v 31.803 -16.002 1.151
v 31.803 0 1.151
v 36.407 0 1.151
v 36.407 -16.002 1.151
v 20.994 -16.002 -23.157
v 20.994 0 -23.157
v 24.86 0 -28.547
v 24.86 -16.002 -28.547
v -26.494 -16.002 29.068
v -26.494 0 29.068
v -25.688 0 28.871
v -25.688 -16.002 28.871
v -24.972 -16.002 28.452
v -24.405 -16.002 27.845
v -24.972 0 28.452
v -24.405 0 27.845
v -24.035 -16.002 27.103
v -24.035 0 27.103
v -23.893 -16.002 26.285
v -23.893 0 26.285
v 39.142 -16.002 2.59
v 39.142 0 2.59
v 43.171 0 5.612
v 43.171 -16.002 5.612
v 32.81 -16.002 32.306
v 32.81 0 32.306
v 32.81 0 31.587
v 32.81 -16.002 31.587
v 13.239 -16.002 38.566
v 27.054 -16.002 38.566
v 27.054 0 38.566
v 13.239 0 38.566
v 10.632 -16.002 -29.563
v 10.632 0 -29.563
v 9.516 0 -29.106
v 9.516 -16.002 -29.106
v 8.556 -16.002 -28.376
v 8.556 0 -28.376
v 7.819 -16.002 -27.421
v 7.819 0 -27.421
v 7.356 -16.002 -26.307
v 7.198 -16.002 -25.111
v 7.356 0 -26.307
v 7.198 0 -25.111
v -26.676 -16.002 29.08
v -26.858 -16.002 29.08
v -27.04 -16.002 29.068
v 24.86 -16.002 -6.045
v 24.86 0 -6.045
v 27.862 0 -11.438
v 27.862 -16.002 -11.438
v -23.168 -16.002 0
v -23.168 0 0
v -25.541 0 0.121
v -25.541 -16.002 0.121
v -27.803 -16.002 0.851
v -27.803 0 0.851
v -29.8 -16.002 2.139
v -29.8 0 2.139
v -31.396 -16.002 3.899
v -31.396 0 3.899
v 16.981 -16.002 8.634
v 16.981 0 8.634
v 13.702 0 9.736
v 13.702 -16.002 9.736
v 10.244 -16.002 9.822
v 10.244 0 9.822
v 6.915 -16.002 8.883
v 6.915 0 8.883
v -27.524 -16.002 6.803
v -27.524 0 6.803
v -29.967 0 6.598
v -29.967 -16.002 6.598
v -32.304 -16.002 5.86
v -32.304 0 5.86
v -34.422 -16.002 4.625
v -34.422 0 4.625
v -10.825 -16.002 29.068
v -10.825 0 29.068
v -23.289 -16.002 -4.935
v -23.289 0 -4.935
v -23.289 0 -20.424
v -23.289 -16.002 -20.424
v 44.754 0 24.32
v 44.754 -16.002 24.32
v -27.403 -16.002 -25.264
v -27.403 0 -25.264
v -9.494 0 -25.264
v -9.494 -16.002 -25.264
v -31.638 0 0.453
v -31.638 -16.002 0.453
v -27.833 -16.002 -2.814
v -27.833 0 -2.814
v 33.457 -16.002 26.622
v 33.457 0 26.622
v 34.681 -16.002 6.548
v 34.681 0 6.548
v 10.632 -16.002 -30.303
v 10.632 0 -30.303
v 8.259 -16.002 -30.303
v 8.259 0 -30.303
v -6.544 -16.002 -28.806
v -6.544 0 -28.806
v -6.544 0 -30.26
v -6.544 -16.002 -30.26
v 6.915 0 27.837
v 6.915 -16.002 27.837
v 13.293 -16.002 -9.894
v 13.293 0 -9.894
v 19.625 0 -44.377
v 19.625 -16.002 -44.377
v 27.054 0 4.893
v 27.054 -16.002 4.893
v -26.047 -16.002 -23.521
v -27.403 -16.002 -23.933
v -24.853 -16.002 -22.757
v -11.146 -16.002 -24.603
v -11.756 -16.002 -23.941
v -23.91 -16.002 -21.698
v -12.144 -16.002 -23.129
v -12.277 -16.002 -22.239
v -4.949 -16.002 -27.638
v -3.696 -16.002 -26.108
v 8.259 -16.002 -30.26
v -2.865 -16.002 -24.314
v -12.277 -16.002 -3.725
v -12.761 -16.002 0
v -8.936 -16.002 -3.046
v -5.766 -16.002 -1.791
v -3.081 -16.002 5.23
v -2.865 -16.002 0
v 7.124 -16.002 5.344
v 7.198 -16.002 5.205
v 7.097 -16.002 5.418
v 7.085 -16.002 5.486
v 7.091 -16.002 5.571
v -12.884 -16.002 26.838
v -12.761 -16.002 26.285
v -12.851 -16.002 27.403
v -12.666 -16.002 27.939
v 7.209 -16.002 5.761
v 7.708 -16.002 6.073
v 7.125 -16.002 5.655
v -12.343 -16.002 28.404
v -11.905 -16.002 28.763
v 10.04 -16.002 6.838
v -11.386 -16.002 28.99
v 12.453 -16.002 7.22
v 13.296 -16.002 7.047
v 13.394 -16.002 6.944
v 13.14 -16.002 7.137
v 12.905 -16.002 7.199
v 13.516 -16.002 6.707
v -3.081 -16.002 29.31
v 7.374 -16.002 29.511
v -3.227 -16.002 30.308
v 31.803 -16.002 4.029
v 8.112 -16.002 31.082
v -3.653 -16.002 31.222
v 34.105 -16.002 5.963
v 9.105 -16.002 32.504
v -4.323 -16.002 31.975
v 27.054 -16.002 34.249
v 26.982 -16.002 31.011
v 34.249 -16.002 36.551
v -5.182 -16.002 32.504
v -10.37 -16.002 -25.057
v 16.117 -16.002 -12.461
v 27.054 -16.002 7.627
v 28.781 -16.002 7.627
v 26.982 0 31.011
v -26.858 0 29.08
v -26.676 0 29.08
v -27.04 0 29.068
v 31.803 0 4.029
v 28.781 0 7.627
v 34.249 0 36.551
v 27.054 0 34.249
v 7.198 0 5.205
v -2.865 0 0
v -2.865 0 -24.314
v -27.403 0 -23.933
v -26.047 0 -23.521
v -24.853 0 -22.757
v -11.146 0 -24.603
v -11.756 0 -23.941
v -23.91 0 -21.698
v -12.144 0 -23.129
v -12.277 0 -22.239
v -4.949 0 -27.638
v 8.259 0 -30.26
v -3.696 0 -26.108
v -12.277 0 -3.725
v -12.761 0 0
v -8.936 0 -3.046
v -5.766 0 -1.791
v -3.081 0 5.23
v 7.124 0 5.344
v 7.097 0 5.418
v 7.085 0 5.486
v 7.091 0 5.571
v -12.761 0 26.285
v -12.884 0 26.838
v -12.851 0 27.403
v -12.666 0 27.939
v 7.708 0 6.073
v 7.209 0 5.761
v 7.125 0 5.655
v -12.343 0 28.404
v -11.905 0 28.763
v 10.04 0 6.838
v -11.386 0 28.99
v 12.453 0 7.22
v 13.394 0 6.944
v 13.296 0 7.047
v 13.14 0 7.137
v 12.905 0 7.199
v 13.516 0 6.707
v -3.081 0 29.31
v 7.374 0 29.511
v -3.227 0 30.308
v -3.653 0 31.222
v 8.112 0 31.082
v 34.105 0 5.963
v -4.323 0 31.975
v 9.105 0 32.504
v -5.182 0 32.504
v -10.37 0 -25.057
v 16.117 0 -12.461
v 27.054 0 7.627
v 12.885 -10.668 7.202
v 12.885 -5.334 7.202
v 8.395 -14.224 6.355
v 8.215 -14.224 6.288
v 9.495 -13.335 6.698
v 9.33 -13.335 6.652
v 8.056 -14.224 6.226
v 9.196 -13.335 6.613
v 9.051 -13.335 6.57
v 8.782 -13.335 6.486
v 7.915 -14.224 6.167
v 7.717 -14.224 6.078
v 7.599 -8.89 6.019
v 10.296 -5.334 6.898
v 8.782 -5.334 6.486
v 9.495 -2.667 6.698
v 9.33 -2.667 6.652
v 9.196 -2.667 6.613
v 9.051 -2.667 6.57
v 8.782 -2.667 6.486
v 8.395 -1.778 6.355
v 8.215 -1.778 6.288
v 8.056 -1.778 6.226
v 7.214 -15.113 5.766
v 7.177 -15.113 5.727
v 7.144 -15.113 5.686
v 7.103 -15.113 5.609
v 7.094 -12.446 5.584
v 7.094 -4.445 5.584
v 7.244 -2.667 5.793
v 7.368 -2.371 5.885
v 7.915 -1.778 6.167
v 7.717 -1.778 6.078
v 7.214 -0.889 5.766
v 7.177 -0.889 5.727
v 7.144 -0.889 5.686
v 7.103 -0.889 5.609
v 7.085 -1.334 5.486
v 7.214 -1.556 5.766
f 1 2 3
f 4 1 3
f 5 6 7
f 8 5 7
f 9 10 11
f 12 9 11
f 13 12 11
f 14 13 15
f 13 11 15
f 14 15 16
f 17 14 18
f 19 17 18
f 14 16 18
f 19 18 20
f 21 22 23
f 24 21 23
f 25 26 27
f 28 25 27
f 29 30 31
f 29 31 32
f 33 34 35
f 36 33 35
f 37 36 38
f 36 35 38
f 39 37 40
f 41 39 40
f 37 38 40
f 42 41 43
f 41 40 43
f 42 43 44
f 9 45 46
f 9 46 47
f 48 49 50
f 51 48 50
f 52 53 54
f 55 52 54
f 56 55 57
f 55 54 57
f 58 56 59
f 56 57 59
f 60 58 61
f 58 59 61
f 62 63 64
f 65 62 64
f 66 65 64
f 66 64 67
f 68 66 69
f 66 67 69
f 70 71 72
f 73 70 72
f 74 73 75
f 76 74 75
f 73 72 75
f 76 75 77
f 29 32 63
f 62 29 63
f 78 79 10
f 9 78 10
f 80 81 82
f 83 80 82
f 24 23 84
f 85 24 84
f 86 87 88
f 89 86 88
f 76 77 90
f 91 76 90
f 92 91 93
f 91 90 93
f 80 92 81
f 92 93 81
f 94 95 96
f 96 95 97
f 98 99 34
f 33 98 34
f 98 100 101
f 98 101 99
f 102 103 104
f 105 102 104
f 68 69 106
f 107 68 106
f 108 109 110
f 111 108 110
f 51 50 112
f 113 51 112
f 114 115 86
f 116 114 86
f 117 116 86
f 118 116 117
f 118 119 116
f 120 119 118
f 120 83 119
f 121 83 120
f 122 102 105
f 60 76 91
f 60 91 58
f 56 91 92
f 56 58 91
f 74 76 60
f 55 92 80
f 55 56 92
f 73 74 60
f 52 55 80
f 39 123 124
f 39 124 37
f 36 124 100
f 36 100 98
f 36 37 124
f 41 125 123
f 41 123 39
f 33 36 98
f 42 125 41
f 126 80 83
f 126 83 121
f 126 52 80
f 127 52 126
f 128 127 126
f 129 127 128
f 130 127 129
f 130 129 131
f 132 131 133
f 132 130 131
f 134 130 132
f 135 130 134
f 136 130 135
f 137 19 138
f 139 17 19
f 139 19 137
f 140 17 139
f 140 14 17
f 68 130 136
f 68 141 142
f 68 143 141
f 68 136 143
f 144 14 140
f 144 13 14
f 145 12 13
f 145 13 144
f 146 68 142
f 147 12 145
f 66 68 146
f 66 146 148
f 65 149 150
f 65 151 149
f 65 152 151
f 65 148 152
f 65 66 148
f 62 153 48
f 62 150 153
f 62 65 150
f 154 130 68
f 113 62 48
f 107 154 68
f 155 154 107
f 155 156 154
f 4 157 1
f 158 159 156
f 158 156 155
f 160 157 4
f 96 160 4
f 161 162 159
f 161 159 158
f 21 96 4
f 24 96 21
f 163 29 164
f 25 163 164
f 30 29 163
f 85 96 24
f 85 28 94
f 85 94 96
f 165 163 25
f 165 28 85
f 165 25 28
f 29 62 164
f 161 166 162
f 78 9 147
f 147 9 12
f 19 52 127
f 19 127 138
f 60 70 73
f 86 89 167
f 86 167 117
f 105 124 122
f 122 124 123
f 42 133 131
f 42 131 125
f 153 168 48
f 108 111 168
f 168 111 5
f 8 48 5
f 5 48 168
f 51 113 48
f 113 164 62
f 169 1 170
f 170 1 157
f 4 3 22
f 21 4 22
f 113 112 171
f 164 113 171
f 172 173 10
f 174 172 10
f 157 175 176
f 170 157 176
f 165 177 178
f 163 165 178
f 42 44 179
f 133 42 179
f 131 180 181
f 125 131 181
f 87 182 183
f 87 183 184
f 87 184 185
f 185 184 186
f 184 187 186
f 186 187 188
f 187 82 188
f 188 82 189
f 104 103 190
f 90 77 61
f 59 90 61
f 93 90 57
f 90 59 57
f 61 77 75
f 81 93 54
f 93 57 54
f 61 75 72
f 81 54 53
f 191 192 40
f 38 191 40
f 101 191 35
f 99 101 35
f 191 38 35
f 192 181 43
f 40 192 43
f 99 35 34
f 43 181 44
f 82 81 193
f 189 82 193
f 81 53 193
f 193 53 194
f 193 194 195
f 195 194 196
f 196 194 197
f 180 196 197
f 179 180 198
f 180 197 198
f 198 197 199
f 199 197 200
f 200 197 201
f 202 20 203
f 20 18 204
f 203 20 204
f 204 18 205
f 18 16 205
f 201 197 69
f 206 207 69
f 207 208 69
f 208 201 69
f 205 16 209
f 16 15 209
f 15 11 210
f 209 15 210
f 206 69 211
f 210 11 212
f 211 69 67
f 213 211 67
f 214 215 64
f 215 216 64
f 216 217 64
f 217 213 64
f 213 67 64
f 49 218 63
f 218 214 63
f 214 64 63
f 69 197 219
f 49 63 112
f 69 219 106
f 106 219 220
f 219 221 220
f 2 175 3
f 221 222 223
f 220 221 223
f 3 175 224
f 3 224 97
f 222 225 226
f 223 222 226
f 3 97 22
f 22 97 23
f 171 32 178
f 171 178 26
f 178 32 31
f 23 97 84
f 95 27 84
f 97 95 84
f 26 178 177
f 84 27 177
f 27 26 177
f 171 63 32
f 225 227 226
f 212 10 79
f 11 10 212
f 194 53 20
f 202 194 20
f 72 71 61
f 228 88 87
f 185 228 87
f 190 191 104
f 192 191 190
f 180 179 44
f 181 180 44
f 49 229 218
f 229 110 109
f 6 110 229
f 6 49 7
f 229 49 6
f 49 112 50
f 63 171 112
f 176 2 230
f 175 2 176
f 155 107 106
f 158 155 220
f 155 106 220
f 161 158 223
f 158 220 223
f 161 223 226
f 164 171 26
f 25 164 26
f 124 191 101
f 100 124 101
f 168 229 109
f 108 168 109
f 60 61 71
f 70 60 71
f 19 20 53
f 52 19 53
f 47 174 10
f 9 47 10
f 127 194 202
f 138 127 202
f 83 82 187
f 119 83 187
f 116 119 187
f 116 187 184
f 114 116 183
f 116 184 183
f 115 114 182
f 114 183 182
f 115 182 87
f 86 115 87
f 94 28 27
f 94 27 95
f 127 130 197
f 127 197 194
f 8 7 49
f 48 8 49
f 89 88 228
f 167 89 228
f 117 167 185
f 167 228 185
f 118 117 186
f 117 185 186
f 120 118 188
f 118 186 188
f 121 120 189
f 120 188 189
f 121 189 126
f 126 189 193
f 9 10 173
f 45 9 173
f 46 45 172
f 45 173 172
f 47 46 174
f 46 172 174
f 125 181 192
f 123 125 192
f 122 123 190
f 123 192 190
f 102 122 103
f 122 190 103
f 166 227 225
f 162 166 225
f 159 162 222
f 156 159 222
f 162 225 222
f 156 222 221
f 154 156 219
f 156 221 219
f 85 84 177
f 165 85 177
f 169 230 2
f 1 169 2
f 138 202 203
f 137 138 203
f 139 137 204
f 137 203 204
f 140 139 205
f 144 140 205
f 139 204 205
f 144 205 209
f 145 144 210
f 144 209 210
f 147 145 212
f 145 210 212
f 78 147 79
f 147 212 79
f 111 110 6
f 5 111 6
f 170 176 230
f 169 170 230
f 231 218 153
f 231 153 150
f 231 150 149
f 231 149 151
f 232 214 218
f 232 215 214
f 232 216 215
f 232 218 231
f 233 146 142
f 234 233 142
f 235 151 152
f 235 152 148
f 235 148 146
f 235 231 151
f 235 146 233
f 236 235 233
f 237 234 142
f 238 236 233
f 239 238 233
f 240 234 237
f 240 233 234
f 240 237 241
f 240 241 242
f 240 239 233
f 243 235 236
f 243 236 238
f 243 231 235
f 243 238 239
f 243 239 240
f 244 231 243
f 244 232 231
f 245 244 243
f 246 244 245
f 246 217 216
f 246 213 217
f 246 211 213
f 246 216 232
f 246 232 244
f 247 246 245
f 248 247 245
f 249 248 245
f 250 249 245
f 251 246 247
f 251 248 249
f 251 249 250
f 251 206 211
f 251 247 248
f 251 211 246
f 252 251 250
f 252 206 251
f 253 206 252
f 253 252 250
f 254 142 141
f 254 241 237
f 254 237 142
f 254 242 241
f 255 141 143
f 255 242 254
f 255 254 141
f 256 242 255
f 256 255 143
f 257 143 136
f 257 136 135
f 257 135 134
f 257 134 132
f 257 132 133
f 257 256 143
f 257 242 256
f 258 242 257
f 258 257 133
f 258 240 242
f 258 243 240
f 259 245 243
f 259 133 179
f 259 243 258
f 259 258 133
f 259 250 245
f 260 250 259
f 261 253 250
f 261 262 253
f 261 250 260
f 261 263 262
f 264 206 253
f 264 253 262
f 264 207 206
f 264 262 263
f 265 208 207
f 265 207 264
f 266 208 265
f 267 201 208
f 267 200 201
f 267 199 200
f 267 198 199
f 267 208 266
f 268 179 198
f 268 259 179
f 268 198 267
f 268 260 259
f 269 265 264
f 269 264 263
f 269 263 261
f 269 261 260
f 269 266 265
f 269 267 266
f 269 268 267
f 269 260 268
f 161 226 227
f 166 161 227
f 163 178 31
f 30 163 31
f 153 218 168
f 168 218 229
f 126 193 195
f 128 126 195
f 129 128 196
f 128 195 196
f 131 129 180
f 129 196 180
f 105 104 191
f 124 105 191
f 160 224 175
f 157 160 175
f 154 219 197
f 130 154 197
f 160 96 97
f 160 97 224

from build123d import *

# Parameters (mm, degrees)
F1_DEPTH = 16.002


with BuildPart() as f1:
    # F0 (on Front) → F1 (new body)
    with BuildSketch(Plane.XZ):
        with BuildLine():
            Line((27.0537436006, 38.5659709574), (13.239065185, 38.5659709574))
            Line((13.239065185, 38.5659709574), (16.9805381445, 8.6341723801))
            ThreePointArc((16.9805381445, 8.6341723801), (11.976038314, 9.9083912486), (6.9146049209, 8.8834306225))
            Line((6.9146049209, 8.8834306225), (6.9146049209, 27.8372149915))
            ThreePointArc((6.9146049209, 27.8372149915), (7.7093409409, 30.3118111922), (9.1052437201, 32.5042270124))
            Line((9.1052437201, 32.5042270124), (-5.1815276965, 32.5042270124))
            ThreePointArc((-5.1815276965, 32.5042270124), (-3.6530011364, 31.2216165027), (-3.0807298608, 29.3100755662))
            Line((-3.0807298608, 29.3100755662), (-3.0807298608, 5.2295997739))
            Line((-3.0807298608, 5.2295997739), (-12.7613237128, 0))
            Line((-12.7613237128, 0), (-12.7613237128, 26.2848902494))
            ThreePointArc((-12.7613237128, 26.2848902494), (-12.5203891975, 28.1823021324), (-10.825204663, 29.0680620819))
            Line((-10.825204663, 29.0680620819), (-26.4943803815, 29.0680620819))
            ThreePointArc((-26.4943803815, 29.0680620819), (-24.6666219188, 28.1691035613), (-23.8929504026, 26.2848902494))
            Line((-23.8929504026, 26.2848902494), (-23.1679603457, 0))
            ThreePointArc((-23.1679603457, 0), (-27.8027720242, 0.8505263045), (-31.3964635134, 3.8985183928))
            Line((-31.3964635134, 3.8985183928), (-27.5242272764, 6.802696269))
            ThreePointArc((-27.5242272764, 6.802696269), (-31.1560989075, 6.2936388165), (-34.4216488302, 4.6245628037))
            ThreePointArc((-34.4216488302, 4.6245628037), (-29.847002669, -1.310113717), (-23.2889689505, -4.9350229092))
            Line((-23.2889689505, -4.9350229092), (-23.2889689505, -20.4239729792))
            ThreePointArc((-23.2889689505, -20.4239729792), (-24.8529476491, -22.7567525796), (-27.4032205343, -23.9331871271))
            Line((-27.4032205343, -23.9331871271), (-27.4032205343, -25.264268741))
            Line((-27.4032205343, -25.264268741), (-9.4941230491, -25.264268741))
            ThreePointArc((-9.4941230491, -25.264268741), (-11.4756575483, -24.2944292872), (-12.2772939503, -22.2390834242))
            Line((-12.2772939503, -22.2390834242), (-12.2772939503, -3.7249489687))
            ThreePointArc((-12.2772939503, -3.7249489687), (-7.3231039856, -2.488739858), (-2.8645857237, 0))
            Line((-2.8645857237, 0), (-2.8645857237, -24.3136435747))
            ThreePointArc((-2.8645857237, -24.3136435747), (-4.2737546698, -26.9123144535), (-6.5438877791, -28.8058146834))
            Line((-6.5438877791, -28.8058146834), (-6.5438877791, -30.2604231983))
            Line((-6.5438877791, -30.2604231983), (8.258885704, -30.2604231983))
            Line((8.258885704, -30.2604231983), (8.258885704, -30.3032044321))
            Line((8.258885704, -30.3032044321), (10.6323713044, -30.3032044321))
            Line((10.6323713044, -30.3032044321), (10.6323713044, -29.5627774231))
            ThreePointArc((10.6323713044, -29.5627774231), (8.1561893699, -27.9223985955), (7.1977237239, -25.111053139))
            Line((7.1977237239, -25.111053139), (7.1977237239, 5.2052573301))
            add(Edge.make_bspline(
                [(13.5162426159, 6.7069013603), (13.4249388226, 6.9233671199), (13.0866426948, 7.7254096812), (6.6779102395, 6.1144842139), (7.0993341098, 5.3773546013), (7.1977237239, 5.2052573301)],
                knots=[0, 0, 0, 0, 0.2207939268, 0.8180791592, 1, 1, 1, 1], degree=3))
            Line((13.5162426159, 6.7069013603), (16.1170735953, -12.4609256162))
            Line((16.1170735953, -12.4609256162), (13.293421827, -9.8939705639))
            Line((13.293421827, -9.8939705639), (19.6252446619, -44.3767309188))
            Line((19.6252446619, -44.3767309188), (20.994286984, -23.1565702706))
            Line((20.994286984, -23.1565702706), (24.860024452, -28.5471752285))
            Line((24.860024452, -28.5471752285), (24.860024452, -6.0454183257))
            Line((24.860024452, -6.0454183257), (27.8617888687, -11.4384172483))
            Line((27.8617888687, -11.4384172483), (27.0537436006, 4.8926970922))
            Line((27.0537436006, 4.8926970922), (26.9817914811, 31.0110691936))
            Line((26.9817914811, 31.0110691936), (32.8098572788, 32.3061943055))
            Line((32.8098572788, 32.3061943055), (32.8098572788, 31.5866805614))
            Line((32.8098572788, 31.5866805614), (33.4574207661, 26.6220308841))
            Line((33.4574207661, 26.6220308841), (34.6805937586, 6.5475800076))
            Line((34.6805937586, 6.5475800076), (34.1049842534, 5.9633367532))
            Line((34.1049842534, 5.9633367532), (31.8025387821, 4.0292809718))
            Line((31.8025387821, 4.0292809718), (28.7805758414, 7.626852952))
            Line((28.7805758414, 7.626852952), (27.0537436006, 7.626852952))
            Line((27.0537436006, 7.626852952), (31.8025387821, 1.151223085))
            Line((31.8025387821, 1.151223085), (36.4074297247, 1.151223085))
            Line((36.4074297247, 1.151223085), (39.1415841875, 2.5902520866))
            Line((39.1415841875, 2.5902520866), (43.1708618996, 5.6122122333))
            Line((43.1708618996, 5.6122122333), (44.7537936268, 24.3195872755))
            Line((44.7537936268, 24.3195872755), (34.2488847671, 36.5513302387))
            Line((34.2488847671, 36.5513302387), (27.0537436006, 34.2488847674))
            Line((27.0537436006, 34.2488847674), (27.0537436006, 38.5659709574))
        make_face()
    extrude(amount=F1_DEPTH)


with BuildPart() as f1b:
    # F0 (on Front) → F1, piece 2 (new body)
    with BuildSketch(Plane.XZ):
        with BuildLine():
            Line((-27.0401984453, 29.0680620819), (-26.4943803815, 29.0680620819))
            ThreePointArc((-26.4943803815, 29.0680620819), (-26.7672894134, 29.0810423617), (-27.0401984453, 29.0680620819))
        make_face()
    extrude(amount=F1_DEPTH)


solid = Compound([f1.part, f1b.part])
